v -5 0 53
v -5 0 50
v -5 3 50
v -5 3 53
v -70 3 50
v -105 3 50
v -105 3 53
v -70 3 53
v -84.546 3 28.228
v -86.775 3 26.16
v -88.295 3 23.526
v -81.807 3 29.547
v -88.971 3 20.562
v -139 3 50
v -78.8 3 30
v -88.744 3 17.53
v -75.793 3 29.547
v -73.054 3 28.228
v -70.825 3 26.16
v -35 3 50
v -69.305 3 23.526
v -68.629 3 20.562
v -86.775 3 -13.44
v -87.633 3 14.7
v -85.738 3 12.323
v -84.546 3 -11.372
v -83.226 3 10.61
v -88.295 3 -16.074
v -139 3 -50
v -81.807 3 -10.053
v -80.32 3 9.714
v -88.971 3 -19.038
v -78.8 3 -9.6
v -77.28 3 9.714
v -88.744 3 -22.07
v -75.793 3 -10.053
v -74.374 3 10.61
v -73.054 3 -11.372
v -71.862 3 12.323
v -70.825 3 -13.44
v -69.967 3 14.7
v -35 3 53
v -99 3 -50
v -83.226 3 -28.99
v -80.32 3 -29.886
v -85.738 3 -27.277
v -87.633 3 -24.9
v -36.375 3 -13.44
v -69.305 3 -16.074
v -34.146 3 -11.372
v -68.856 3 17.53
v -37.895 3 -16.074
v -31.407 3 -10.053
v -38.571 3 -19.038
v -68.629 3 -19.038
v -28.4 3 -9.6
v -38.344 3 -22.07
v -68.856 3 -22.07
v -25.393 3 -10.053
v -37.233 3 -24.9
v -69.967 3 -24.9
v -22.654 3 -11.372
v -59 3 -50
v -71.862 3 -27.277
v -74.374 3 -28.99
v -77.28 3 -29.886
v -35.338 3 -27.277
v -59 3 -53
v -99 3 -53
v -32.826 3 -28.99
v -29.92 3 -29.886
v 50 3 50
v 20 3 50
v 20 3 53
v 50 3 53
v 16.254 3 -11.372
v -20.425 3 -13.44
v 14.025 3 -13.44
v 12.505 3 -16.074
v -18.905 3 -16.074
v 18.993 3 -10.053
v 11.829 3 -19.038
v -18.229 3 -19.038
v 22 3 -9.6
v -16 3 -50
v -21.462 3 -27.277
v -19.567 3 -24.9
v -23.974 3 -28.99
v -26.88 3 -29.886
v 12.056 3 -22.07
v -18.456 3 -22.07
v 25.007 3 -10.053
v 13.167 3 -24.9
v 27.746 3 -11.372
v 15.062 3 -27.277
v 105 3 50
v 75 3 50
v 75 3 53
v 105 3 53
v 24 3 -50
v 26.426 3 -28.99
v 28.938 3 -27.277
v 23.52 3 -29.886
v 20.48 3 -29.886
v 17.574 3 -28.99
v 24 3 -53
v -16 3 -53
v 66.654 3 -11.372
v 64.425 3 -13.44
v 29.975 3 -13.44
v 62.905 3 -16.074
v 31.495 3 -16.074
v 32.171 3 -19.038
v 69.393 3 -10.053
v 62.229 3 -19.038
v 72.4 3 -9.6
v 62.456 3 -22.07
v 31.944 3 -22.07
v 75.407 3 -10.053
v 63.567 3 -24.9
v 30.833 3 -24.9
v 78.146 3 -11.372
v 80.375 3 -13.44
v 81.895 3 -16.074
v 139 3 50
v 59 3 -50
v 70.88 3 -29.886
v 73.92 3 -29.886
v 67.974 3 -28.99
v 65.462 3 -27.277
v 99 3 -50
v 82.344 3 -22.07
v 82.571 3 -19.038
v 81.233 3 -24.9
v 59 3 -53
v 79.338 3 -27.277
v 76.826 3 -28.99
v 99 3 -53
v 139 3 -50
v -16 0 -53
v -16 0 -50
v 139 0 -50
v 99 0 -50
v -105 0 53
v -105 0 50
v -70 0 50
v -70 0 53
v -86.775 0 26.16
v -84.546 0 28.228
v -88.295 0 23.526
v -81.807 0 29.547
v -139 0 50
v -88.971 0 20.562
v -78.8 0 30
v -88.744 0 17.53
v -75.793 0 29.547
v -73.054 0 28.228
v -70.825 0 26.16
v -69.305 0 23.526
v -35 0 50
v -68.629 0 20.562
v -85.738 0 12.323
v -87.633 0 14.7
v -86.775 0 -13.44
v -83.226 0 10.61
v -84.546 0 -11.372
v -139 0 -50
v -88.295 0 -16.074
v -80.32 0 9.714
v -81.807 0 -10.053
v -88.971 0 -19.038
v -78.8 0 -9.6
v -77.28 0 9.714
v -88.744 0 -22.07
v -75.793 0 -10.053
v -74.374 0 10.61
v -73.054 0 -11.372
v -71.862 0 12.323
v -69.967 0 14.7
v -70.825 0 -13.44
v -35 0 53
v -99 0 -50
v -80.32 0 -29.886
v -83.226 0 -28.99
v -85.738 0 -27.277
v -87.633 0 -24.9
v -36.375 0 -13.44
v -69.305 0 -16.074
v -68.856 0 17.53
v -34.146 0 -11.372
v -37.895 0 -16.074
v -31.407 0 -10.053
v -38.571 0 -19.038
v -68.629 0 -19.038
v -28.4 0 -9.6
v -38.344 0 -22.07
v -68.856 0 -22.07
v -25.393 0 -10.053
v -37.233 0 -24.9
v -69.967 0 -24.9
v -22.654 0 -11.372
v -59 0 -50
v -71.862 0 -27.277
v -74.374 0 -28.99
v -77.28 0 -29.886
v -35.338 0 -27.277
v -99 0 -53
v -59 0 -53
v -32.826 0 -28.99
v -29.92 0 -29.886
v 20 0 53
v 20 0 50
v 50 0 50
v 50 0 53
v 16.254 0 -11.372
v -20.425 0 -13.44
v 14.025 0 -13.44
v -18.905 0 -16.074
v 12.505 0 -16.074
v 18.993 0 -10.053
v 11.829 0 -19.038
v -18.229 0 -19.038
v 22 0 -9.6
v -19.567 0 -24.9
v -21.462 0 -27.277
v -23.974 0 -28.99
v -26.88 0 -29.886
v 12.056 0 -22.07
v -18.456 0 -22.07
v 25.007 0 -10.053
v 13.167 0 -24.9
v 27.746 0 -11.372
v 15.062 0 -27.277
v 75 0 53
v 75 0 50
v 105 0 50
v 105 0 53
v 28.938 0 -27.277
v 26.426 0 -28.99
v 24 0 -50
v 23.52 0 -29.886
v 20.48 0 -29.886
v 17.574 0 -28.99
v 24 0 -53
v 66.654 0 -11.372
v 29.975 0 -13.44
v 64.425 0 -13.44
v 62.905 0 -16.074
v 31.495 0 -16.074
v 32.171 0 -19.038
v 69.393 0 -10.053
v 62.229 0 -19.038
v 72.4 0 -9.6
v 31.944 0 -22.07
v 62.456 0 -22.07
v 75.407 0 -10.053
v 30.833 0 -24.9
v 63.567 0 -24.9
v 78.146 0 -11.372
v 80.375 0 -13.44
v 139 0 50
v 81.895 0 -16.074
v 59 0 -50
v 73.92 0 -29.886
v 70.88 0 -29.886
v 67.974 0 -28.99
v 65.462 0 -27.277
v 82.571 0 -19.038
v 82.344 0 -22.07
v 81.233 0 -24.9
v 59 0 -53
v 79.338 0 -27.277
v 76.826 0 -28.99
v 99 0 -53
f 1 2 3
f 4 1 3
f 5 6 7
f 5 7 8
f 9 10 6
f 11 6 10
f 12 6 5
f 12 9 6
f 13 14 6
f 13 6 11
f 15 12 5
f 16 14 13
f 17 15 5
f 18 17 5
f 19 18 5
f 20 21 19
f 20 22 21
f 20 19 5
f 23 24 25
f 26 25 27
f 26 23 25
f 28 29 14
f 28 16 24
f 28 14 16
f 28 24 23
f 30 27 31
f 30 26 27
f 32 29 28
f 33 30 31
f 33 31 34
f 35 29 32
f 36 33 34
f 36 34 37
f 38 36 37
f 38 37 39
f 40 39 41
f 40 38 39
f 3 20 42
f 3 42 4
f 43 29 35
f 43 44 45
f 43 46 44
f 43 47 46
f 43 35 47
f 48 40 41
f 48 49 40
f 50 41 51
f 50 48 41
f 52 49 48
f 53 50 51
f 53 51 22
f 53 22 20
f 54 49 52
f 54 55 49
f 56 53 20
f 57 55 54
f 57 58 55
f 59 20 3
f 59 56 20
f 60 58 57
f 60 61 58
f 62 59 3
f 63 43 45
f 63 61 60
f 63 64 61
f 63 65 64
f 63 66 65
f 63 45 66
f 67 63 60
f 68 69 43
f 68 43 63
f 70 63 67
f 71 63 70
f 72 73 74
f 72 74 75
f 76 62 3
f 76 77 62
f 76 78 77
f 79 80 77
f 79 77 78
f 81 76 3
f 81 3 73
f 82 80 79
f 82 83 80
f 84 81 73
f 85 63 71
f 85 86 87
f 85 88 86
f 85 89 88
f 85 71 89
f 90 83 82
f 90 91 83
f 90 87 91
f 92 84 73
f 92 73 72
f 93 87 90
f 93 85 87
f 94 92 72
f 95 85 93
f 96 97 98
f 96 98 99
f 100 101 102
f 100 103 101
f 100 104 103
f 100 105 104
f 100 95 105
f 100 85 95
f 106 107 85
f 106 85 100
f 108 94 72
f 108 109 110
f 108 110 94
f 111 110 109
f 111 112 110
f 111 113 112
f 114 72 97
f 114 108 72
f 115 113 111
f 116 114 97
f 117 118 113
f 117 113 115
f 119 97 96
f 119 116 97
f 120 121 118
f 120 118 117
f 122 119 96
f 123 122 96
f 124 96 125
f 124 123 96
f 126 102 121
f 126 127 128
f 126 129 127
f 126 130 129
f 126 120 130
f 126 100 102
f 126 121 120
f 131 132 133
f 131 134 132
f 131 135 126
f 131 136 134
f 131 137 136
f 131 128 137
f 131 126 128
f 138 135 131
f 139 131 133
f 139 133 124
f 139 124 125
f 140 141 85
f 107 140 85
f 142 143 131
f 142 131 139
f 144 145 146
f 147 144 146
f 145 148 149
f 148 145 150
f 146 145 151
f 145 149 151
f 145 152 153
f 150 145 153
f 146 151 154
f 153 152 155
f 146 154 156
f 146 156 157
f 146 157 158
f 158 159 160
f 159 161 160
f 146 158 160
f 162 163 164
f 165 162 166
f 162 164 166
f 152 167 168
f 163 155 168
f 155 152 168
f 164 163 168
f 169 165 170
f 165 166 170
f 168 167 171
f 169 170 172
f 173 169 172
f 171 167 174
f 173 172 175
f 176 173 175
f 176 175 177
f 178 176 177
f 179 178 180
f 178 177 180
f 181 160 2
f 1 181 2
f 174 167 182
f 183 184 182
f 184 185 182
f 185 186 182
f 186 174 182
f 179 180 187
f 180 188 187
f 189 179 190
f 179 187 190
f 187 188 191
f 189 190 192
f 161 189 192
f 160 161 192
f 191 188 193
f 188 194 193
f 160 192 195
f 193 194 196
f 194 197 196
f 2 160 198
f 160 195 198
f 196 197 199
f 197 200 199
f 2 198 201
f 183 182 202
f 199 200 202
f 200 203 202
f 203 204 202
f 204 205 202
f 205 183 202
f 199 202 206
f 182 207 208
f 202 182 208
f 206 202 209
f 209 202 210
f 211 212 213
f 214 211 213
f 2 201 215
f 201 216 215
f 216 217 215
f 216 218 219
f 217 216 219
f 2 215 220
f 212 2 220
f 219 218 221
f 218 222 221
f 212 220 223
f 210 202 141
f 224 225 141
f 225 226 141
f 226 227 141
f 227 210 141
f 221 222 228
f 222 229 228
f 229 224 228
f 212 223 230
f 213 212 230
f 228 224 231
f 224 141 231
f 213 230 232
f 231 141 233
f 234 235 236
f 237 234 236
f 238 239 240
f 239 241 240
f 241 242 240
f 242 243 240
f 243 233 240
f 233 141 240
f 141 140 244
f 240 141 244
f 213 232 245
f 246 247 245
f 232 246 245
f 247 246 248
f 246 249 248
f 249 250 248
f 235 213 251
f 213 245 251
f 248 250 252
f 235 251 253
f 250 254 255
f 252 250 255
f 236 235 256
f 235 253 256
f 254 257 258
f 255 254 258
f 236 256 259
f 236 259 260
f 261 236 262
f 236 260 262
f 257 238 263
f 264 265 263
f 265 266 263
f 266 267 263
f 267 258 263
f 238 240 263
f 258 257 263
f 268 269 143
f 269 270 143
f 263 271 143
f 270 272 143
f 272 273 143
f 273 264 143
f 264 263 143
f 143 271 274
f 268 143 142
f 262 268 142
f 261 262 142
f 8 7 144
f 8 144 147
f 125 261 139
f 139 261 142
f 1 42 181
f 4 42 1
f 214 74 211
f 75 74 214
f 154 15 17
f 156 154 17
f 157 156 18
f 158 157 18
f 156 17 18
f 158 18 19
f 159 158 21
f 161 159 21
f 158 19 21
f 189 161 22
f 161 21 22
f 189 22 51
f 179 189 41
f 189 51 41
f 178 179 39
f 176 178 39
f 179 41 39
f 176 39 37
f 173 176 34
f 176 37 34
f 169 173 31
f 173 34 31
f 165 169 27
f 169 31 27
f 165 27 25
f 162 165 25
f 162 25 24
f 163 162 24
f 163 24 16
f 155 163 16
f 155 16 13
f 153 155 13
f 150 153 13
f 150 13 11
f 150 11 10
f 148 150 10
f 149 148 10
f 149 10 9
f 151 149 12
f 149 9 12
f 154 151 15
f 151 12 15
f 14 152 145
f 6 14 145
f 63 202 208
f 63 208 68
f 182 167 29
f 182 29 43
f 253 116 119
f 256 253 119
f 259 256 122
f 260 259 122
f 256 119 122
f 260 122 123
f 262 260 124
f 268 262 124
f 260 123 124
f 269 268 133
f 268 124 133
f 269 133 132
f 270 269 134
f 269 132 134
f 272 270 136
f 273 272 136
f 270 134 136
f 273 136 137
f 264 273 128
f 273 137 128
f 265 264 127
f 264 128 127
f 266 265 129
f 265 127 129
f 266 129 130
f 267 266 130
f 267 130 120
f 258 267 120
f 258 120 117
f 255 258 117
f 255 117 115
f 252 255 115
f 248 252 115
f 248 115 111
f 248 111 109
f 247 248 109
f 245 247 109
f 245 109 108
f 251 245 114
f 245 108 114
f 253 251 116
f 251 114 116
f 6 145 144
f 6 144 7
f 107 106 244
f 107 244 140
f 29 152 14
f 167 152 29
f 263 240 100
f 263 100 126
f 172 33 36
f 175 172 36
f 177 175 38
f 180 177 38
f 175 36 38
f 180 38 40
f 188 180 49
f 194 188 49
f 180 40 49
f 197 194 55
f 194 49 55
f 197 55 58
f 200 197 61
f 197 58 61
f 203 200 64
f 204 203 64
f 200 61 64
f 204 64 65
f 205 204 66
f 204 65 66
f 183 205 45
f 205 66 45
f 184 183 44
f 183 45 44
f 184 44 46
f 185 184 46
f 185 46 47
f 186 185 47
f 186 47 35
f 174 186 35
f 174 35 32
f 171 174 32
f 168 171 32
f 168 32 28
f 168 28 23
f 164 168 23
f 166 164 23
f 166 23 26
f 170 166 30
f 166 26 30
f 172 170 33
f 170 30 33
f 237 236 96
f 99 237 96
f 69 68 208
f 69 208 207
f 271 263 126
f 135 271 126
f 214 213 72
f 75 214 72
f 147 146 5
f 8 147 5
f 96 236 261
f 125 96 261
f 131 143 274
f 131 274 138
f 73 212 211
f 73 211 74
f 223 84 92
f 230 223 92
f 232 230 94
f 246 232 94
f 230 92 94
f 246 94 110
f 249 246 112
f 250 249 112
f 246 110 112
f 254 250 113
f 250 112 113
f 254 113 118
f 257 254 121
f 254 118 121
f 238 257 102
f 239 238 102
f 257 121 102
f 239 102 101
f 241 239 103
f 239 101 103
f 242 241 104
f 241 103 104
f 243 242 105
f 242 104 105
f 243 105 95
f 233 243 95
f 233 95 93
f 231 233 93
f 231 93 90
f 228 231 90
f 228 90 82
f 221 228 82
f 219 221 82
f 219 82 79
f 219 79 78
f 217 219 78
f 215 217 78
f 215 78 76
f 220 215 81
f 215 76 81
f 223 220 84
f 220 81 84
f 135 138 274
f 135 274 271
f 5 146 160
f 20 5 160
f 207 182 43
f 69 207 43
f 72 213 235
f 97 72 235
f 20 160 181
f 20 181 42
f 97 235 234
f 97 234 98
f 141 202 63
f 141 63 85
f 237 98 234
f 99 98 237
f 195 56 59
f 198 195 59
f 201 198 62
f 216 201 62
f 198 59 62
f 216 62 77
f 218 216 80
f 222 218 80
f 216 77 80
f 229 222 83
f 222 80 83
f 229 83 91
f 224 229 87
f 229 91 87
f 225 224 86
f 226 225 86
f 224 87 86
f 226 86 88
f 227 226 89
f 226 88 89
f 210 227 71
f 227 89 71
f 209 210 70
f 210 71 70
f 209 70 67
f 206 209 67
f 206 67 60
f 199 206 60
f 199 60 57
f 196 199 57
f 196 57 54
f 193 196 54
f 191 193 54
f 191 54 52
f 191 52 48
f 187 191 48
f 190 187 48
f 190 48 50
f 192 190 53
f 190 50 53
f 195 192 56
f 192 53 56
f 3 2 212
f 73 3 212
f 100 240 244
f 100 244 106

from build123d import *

# Parameters (mm, degrees)
SKETCH1_W           = 278
SKETCH1_H           = 100
BOSS_EXTRUDE1_DEPTH = 3
SKETCH2_W           = 40
SKETCH2_H           = 3
BOSS_EXTRUDE2_DEPTH = 3
SKETCH3_R           = 10.2
CUT_EXTRUDE1_DEPTH  = 3
SKETCH4_W           = 35
SKETCH4_H           = 3
SKETCH4_W_2         = 30
BOSS_EXTRUDE3_DEPTH = 3


with BuildPart() as part:
    # Sketch1 → Boss-Extrude1 (new body)
    with BuildSketch(Plane(origin=(0, 0, 0), x_dir=(1, 0, 0), z_dir=(0, 1, 0))):
        Rectangle(SKETCH1_W, SKETCH1_H)
    extrude(amount=BOSS_EXTRUDE1_DEPTH)

    # Sketch2 → Boss-Extrude2 (add)
    with BuildSketch(Plane(origin=(0, 0, -50), x_dir=(-1, 0, 0), z_dir=(0, 0, -1))):
        with Locations((-79, 1.5)):
            Rectangle(SKETCH2_W, SKETCH2_H)
        with Locations((-4, 1.5)):
            Rectangle(SKETCH2_W, SKETCH2_H)
        with Locations((79, 1.5)):
            Rectangle(SKETCH2_W, SKETCH2_H)
    extrude(amount=BOSS_EXTRUDE2_DEPTH)

    # Sketch3 → Cut-Extrude1 (cut)
    with BuildSketch(Plane(origin=(0, 3, 0), x_dir=(1, 0, 0), z_dir=(0, 1, 0))):
        with Locations(Location((72.4, 19.8, 0), (0, 0, 270))):
            Circle(SKETCH3_R)
        with Locations(Location((-78.8, -19.8, 0), (0, 0, 270))):
            Circle(SKETCH3_R)
        with Locations(Location((22, 19.8, 0), (0, 0, 270))):
            Circle(SKETCH3_R)
        with Locations(Location((-28.4, 19.8, 0), (0, 0, 270))):
            Circle(SKETCH3_R)
        with Locations(Location((-78.8, 19.8, 0), (0, 0, 270))):
            Circle(SKETCH3_R)
    extrude(amount=-CUT_EXTRUDE1_DEPTH, mode=Mode.SUBTRACT)

    # Sketch4 → Boss-Extrude3 (add)
    with BuildSketch(Plane.XY.offset(50)):
        with Locations((-87.5, 1.5)):
            Rectangle(SKETCH4_W, SKETCH4_H)
        with Locations((-20, 1.5)):
            Rectangle(SKETCH4_W_2, SKETCH4_H)
        with Locations((35, 1.5)):
            Rectangle(SKETCH4_W_2, SKETCH4_H)
        with Locations((90, 1.5)):
            Rectangle(SKETCH4_W_2, SKETCH4_H)
    extrude(amount=BOSS_EXTRUDE3_DEPTH)


solid = part.part
